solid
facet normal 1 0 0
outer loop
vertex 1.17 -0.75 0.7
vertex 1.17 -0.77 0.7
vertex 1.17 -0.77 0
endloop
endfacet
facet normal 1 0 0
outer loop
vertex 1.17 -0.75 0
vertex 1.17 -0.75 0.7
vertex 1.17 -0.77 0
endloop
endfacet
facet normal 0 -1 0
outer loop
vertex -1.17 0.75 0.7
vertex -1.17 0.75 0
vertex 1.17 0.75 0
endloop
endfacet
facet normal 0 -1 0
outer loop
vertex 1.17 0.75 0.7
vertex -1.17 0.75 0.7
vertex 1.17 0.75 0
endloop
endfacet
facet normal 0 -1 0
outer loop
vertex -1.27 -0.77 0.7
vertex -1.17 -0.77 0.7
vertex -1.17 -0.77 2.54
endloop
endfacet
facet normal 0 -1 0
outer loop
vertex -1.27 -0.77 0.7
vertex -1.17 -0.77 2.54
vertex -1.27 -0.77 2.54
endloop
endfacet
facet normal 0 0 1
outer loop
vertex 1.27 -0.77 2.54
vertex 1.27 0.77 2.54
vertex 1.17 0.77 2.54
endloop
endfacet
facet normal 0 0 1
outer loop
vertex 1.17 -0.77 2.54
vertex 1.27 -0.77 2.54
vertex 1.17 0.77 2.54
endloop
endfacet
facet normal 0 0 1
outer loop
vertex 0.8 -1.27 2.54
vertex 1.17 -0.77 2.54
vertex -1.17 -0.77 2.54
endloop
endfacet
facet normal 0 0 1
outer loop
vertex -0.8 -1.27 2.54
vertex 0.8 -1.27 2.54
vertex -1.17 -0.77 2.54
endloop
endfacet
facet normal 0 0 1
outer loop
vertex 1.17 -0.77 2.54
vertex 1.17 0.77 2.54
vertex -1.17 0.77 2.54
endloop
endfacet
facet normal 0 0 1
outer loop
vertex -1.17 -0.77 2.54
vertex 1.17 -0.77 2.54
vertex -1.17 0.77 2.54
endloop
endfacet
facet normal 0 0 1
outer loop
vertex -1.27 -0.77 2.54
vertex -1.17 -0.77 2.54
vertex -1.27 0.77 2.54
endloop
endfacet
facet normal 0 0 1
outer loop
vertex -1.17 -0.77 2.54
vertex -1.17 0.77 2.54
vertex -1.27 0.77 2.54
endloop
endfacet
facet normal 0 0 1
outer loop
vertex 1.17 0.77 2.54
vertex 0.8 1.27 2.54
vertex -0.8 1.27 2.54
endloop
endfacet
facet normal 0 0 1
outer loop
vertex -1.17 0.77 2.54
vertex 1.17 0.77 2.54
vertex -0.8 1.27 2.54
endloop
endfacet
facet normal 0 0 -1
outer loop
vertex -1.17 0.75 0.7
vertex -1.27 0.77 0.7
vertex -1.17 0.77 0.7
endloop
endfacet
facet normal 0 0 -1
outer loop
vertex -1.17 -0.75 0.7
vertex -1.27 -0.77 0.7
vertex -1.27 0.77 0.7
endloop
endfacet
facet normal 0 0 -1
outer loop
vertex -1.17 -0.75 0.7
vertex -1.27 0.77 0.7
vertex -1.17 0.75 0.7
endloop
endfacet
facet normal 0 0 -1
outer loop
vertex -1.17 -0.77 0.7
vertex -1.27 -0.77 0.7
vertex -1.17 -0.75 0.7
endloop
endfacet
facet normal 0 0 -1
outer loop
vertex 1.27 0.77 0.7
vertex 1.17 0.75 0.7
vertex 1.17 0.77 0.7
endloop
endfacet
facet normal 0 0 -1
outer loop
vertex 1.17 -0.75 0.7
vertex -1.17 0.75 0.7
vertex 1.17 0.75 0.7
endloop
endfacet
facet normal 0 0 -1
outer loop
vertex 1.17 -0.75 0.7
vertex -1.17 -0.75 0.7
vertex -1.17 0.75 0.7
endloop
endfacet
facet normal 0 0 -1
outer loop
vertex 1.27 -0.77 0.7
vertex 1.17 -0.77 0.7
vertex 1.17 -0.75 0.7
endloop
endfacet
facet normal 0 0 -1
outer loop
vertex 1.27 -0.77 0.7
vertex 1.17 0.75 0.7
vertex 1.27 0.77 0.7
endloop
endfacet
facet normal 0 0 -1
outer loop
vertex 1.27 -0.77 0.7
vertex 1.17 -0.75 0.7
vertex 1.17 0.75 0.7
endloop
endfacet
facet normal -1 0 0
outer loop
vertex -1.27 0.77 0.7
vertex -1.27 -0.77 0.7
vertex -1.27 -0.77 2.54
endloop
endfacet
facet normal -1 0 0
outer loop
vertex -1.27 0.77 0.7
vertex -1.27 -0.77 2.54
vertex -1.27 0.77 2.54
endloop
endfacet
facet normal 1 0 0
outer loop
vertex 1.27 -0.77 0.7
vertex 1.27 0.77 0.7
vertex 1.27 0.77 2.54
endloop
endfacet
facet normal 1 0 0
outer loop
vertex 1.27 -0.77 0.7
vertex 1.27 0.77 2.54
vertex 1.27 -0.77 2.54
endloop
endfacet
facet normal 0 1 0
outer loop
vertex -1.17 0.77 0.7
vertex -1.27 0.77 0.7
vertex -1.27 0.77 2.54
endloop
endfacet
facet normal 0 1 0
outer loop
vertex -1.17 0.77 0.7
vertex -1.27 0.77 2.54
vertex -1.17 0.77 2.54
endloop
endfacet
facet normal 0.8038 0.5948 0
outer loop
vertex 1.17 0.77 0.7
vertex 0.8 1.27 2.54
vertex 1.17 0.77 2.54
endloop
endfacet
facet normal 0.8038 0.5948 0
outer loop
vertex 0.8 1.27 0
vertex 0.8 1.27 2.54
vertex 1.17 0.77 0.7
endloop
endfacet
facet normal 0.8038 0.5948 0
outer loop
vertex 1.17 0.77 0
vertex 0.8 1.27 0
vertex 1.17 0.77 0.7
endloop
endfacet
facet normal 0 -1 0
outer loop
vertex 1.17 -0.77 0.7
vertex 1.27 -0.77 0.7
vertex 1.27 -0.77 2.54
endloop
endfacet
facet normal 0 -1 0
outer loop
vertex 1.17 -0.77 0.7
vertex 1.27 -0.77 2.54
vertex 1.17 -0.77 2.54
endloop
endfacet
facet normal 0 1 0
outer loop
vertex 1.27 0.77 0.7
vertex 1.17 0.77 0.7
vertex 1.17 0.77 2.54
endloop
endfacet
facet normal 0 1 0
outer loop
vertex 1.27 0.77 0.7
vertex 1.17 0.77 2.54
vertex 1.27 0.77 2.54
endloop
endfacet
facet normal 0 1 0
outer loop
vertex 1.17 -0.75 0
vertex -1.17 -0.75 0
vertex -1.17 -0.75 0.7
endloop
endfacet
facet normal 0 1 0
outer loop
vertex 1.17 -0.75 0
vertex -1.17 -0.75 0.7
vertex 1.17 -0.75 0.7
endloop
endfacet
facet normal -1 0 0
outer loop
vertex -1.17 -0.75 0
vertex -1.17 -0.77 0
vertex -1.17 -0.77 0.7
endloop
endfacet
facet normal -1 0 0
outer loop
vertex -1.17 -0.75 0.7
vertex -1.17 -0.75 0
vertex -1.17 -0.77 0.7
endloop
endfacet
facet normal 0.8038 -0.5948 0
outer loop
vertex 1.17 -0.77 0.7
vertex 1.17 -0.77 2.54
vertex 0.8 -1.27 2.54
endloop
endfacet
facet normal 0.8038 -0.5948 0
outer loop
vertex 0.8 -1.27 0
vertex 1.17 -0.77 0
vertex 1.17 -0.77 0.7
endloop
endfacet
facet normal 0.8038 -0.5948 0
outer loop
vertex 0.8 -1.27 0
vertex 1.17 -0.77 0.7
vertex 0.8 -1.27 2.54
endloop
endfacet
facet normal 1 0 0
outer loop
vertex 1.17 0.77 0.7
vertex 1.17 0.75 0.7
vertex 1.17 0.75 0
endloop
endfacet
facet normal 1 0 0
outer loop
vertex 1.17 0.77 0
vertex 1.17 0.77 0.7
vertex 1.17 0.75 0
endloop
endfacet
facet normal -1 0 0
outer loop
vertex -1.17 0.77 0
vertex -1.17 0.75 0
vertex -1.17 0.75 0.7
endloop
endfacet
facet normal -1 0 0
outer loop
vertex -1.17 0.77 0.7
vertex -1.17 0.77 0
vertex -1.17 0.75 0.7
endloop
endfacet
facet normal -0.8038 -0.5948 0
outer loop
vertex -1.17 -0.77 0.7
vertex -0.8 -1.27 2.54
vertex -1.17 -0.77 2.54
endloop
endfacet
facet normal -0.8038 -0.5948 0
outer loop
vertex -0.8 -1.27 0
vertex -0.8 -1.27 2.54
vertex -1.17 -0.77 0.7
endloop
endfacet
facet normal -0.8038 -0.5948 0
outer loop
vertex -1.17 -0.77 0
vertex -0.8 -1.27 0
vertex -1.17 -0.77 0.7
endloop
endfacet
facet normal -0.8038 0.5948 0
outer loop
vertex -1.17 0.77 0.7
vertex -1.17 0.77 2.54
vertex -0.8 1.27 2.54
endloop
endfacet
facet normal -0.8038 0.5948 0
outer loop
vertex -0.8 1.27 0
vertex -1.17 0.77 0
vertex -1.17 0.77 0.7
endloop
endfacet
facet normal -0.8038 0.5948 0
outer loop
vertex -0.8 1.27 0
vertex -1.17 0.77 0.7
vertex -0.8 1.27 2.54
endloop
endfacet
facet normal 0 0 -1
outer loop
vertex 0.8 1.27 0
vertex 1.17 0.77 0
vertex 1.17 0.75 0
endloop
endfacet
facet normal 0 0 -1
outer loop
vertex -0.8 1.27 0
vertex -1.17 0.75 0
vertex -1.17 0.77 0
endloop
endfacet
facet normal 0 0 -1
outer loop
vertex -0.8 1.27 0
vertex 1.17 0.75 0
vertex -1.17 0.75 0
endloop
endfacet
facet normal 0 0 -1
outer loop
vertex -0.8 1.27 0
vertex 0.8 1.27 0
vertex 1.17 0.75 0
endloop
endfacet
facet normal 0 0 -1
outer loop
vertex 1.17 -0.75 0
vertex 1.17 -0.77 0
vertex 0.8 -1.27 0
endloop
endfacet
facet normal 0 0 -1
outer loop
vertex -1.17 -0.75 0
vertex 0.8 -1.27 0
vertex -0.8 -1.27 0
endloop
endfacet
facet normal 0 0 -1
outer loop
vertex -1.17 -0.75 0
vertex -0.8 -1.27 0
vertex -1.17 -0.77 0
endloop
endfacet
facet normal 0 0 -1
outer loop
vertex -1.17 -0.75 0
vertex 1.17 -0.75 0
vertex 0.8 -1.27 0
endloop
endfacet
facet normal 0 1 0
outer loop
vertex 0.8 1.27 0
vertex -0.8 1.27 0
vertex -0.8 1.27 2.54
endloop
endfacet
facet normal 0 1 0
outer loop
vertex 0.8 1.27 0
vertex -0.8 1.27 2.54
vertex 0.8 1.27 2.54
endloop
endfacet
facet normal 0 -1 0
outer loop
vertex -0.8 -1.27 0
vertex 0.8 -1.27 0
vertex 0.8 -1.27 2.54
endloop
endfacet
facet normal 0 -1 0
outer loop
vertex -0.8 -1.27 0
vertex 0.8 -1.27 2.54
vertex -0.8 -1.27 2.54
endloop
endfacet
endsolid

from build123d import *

# Parameters (mm, degrees)
PAD002_DEPTH       = 2.54
SKETCH007_W        = 0.2
SKETCH007_H        = 0.8
POCKET001002_DEPTH = 2.041
SKETCH008_W        = 3
SKETCH008_H        = 1.5
POCKET001003_DEPTH = 0.7


with BuildPart() as part:
    # Sketch006 → Pad002 (new body)
    with BuildSketch(Plane.XY):
        Polygon((-1.27, 0.77), (-1.17, 0.77), (-0.8, 1.27), (0.8, 1.27), (1.17, 0.77), (1.27, 0.77), (1.27, -0.77), (1.17, -0.77), (0.8, -1.27), (-0.8, -1.27), (-1.17, -0.77), (-1.27, -0.77), align=None)
    extrude(amount=PAD002_DEPTH)

    # Sketch007 (on Face8 of Pad002) → Pocket001002 (cut, through all)
    with BuildSketch(Plane.XZ.offset(0.77)):
        Polygon((1.17, 0.7), (1.27, 0.7), (1.37, 0.7), (1.37, -0.1), (1.17, -0.1), (1.17, 0), align=None)
        with Locations((-1.27, 0.3)):
            Rectangle(SKETCH007_W, SKETCH007_H)
    extrude(amount=-POCKET001002_DEPTH, mode=Mode.SUBTRACT)

    # Sketch008 (on Face16 of Pocket001002) → Pocket001003 (cut)
    with BuildSketch(Plane(origin=(0, 0, 0), x_dir=(1, 0, 0), z_dir=(0, 0, -1))):
        Rectangle(SKETCH008_W, SKETCH008_H)
    extrude(amount=-POCKET001003_DEPTH, mode=Mode.SUBTRACT)


solid = part.part
